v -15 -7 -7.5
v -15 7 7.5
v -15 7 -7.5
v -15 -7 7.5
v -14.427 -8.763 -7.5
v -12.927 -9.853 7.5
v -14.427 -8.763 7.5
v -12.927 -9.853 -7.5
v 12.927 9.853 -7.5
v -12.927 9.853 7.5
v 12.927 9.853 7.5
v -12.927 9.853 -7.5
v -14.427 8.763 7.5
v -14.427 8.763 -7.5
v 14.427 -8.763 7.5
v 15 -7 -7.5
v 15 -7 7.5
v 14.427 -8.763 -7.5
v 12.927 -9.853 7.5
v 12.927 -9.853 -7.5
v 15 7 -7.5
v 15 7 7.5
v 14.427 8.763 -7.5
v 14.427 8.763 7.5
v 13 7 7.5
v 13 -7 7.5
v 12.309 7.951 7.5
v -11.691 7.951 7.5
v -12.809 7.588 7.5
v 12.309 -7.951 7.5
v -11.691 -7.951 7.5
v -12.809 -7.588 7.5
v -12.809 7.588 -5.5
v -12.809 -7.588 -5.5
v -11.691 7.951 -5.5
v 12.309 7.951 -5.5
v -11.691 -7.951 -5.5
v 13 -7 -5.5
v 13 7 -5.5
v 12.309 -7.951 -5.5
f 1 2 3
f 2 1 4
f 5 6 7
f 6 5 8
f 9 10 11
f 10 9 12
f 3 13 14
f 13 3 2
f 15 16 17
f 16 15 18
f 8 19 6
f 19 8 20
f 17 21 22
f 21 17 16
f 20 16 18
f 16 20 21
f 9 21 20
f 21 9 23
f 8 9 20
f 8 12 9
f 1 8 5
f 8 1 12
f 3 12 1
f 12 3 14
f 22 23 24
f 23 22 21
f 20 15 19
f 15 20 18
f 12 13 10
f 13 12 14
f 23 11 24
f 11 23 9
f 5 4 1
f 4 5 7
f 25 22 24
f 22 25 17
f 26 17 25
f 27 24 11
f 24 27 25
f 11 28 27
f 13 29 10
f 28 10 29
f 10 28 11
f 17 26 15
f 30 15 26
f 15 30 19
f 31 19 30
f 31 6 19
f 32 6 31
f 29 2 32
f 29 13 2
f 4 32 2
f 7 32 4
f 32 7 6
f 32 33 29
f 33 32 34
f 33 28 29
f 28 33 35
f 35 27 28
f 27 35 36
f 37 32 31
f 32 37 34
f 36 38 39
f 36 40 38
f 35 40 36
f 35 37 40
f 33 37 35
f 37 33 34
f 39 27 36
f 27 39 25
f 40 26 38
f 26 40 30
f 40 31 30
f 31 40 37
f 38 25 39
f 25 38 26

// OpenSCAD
// Parametric Design Example
// This shows how to create customizable designs with parameters

// Parameters - adjust these values to customize the design
width = 30;
height = 20;
depth = 15;
wall_thickness = 2;
corner_radius = 3;

// Main box with rounded corners
module rounded_box(w, h, d, r) {
    hull() {
        for (x = [-w/2 + r, w/2 - r]) {
            for (y = [-h/2 + r, h/2 - r]) {
                translate([x, y, 0]) {
                    cylinder(h=d, r=r, center=true);
                }
            }
        }
    }
}

// Create the main object
difference() {
    // Outer box
    rounded_box(width, height, depth, corner_radius);
    
    // Inner cavity
    translate([0, 0, wall_thickness]) {
        rounded_box(
            width - 2*wall_thickness, 
            height - 2*wall_thickness, 
            depth, 
            corner_radius - wall_thickness
        );
    }
}
